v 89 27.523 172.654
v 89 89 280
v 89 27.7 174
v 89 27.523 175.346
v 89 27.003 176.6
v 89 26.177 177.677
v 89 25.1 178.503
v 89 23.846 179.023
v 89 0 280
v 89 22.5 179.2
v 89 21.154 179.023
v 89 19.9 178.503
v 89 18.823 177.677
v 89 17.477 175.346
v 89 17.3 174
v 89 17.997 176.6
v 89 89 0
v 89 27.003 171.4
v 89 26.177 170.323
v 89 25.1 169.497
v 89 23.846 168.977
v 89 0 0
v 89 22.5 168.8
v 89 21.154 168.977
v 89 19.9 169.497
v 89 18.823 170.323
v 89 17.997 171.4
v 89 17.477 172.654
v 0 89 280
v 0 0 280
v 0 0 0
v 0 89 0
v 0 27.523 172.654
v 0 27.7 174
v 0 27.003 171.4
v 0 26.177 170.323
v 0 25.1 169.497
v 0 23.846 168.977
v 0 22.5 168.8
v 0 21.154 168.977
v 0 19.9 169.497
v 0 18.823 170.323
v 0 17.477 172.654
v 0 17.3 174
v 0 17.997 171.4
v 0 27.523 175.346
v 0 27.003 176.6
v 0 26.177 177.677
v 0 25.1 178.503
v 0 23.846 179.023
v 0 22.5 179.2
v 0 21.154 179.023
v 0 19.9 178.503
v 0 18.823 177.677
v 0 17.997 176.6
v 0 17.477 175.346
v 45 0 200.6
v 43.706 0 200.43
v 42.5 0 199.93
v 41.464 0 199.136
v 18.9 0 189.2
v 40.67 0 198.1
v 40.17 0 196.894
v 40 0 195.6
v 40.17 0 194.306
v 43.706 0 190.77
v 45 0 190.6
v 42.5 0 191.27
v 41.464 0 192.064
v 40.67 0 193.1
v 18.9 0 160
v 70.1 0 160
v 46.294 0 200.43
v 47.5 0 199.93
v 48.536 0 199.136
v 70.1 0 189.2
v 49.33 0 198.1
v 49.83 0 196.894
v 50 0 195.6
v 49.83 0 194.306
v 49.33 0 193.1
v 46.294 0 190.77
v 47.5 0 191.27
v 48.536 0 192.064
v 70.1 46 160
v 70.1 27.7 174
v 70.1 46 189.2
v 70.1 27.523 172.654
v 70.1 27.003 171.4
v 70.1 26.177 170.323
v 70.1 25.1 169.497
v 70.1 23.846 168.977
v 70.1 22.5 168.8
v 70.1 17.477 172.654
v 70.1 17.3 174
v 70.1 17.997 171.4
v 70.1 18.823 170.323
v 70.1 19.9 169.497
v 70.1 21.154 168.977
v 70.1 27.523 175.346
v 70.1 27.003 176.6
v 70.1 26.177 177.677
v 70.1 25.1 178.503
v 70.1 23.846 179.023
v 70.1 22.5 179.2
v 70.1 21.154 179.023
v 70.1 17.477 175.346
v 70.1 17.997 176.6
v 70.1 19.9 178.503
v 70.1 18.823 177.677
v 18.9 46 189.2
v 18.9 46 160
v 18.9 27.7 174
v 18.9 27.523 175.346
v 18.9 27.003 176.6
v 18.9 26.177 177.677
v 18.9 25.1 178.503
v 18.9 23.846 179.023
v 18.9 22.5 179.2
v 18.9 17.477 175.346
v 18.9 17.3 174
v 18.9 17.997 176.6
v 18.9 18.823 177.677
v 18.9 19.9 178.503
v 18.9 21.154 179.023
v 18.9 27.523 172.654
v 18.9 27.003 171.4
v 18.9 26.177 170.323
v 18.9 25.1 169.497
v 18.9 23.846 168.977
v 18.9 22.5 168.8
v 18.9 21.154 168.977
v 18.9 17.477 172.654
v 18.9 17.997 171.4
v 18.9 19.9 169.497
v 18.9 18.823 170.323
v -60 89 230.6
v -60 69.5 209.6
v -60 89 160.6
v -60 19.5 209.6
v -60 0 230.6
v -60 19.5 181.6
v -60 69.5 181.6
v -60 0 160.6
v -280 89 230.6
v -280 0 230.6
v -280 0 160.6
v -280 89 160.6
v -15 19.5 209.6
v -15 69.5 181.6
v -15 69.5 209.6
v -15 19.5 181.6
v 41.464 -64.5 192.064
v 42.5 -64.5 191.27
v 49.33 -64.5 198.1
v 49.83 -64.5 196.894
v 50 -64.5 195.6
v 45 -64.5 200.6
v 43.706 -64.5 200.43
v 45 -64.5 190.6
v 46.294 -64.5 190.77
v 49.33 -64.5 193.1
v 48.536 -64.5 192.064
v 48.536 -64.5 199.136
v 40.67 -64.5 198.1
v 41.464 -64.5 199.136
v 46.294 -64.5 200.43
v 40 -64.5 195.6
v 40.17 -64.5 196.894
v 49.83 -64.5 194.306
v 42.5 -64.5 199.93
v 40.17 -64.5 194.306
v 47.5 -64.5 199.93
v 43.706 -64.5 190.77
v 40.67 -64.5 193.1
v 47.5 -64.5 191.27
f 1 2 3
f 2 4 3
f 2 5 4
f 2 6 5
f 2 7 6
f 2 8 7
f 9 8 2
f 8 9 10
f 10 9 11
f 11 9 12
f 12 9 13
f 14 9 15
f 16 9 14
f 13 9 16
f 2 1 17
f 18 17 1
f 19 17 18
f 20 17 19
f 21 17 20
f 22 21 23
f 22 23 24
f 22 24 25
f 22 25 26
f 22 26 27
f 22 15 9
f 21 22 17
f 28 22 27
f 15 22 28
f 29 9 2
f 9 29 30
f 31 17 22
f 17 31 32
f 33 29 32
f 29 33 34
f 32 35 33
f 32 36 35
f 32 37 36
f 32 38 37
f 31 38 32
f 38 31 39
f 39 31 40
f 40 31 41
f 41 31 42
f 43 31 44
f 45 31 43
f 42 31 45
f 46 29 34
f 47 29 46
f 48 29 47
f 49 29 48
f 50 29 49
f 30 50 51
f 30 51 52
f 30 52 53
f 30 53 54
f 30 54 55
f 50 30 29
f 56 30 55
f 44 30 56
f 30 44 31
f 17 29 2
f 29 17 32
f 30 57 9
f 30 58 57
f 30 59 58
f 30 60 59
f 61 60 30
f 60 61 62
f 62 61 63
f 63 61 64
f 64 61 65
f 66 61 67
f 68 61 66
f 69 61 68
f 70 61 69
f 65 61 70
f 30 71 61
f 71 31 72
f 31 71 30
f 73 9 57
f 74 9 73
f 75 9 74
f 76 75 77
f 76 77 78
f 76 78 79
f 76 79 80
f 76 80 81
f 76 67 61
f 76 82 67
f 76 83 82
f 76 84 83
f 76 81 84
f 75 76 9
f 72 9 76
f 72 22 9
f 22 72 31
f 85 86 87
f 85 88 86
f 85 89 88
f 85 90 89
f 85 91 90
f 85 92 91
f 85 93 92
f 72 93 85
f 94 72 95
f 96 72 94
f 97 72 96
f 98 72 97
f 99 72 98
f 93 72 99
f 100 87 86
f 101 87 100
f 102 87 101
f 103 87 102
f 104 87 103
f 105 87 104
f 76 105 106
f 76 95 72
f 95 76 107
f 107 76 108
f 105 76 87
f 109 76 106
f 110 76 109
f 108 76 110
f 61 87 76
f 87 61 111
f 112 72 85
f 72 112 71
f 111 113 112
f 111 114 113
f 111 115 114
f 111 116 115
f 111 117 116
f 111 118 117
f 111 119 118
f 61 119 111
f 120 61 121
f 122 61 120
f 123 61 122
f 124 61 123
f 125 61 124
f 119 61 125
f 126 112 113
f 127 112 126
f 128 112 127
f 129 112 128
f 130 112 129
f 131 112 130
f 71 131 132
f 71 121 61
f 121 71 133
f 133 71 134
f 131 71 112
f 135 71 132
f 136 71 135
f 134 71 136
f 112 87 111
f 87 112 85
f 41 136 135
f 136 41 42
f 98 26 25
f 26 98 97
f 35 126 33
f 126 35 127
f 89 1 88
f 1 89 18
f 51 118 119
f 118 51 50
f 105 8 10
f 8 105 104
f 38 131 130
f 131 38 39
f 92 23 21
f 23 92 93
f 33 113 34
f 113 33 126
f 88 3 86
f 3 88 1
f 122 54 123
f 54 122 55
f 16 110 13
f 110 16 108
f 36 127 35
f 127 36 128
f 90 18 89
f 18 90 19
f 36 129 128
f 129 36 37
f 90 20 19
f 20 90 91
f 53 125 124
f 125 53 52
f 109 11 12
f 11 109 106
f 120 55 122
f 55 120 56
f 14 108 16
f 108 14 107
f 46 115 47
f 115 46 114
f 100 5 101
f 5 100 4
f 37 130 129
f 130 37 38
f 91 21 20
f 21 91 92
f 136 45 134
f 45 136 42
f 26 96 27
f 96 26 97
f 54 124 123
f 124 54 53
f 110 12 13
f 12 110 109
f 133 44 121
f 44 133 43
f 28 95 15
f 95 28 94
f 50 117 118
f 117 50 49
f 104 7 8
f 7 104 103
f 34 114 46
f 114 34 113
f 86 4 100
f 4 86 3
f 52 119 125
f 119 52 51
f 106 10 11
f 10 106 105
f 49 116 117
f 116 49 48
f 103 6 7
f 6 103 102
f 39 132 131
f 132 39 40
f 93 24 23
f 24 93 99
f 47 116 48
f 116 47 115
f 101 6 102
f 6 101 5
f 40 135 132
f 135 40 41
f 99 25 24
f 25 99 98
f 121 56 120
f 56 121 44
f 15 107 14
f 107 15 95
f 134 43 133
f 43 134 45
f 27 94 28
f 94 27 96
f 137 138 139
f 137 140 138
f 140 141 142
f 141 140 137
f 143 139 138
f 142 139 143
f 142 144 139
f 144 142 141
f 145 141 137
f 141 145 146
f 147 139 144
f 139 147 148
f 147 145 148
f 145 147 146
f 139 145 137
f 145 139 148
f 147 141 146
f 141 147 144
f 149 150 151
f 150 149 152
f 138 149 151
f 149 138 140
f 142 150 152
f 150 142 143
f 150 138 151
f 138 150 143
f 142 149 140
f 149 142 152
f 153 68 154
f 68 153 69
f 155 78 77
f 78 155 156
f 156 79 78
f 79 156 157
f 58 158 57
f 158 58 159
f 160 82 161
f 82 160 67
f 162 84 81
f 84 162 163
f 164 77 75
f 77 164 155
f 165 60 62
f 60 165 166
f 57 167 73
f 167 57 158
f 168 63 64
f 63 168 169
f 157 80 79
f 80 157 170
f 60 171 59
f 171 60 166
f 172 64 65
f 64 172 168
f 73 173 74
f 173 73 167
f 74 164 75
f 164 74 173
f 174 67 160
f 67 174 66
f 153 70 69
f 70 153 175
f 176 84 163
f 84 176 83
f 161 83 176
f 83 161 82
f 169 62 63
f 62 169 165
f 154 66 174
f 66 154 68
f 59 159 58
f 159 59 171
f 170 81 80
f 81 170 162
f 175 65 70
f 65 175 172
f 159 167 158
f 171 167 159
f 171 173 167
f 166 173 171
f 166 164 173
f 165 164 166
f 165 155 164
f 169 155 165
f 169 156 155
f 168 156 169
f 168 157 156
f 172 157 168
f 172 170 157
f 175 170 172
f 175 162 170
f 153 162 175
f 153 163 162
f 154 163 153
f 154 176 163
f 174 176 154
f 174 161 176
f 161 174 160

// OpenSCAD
// file: hashira_lib.scad
// HASHIRA — shared dimensions (mm)
// Tunable via -D on the command line / OpenSCAD MCP variables

post_w = 89;          // ~3.5" nominal 4x4
post_d = 89;
post_h = 1800;        // above-grade height shown
rail_w = 89;          // rail width (through post face)
rail_t = 38;          // rail thickness
rail_len = 1800;      // bay center-to-center approx
bay_cc = 1800;        // post center spacing
cap_overhang = 18;
cap_h = 28;

// rail elevations from post bottom (above grade in model)
rail_z_low = 200;
rail_z_mid = 900;
rail_z_top = 1500;

ease = 1.2;           // seasonal mortise ease
peg_d = 10;
wood_post = [0.55, 0.35, 0.18];
wood_rail = [0.42, 0.52, 0.34];
wood_peg  = [0.72, 0.62, 0.42];

module hashira_post(h=post_h, w=post_w, d=post_d) {
  color(wood_post) cube([w, d, h], center=false);
}

module hashira_cap(w=post_w, d=post_d, oh=cap_overhang, h=cap_h) {
  color([0.88, 0.85, 0.78])
  translate([-oh, -oh, 0])
    linear_extrude(height=h, scale=0.72)
      square([w + 2*oh, d + 2*oh], center=false);
}

module nuki_rail(len=rail_len, w=rail_w, t=rail_t) {
  color(wood_rail) cube([len, w, t], center=false);
}

module peg(h=post_d + 20, d=peg_d) {
  color(wood_peg) cylinder(h=h, d=d, $fn=24);
}
// main file
// Hozo ほぞ — mortise & tenon with drawbored peg (gate/cap)
include <hashira_lib.scad>

exploded = 1;
tenon_l = 45;
tenon_t = 28;
tenon_w = 50;
explode_gap = 60;

module hozo_assembly() {
  // vertical post stub
  difference() {
    hashira_post(h=280, w=post_w, d=post_d);
    translate([(post_w - tenon_w)/2 - ease/2, -1, 160])
      cube([tenon_w + ease, tenon_l + 2, tenon_t + ease]);
    // peg hole (drawbore offset -1.5mm)
    translate([post_w/2, tenon_l/2, 160 + tenon_t/2])
      rotate([0,90,0]) cylinder(h=post_w + 4, d=peg_d + 0.4, center=true, $fn=24);
  }

  // horizontal member with tenon
  tx = exploded ? -220 - explode_gap : -220;
  translate([tx, 0, 160 + ease/2]) {
    color(wood_rail) {
      cube([220, post_d, 70]);
      translate([220, (post_d - tenon_w)/2, (70 - tenon_t)/2])
        cube([tenon_l, tenon_w, tenon_t]);
    }
    // peg hole in tenon (unoffset) for drawbore
    if (!exploded) {
      translate([220 + tenon_l/2 + 1.5, post_d/2, 35])
        rotate([90,0,0]) peg(h=post_d + 20);
    } else {
      translate([220 + tenon_l + explode_gap, post_d/2, 35])
        rotate([90,0,0]) peg(h=post_d + 20);
    }
  }
}

hozo_assembly();
